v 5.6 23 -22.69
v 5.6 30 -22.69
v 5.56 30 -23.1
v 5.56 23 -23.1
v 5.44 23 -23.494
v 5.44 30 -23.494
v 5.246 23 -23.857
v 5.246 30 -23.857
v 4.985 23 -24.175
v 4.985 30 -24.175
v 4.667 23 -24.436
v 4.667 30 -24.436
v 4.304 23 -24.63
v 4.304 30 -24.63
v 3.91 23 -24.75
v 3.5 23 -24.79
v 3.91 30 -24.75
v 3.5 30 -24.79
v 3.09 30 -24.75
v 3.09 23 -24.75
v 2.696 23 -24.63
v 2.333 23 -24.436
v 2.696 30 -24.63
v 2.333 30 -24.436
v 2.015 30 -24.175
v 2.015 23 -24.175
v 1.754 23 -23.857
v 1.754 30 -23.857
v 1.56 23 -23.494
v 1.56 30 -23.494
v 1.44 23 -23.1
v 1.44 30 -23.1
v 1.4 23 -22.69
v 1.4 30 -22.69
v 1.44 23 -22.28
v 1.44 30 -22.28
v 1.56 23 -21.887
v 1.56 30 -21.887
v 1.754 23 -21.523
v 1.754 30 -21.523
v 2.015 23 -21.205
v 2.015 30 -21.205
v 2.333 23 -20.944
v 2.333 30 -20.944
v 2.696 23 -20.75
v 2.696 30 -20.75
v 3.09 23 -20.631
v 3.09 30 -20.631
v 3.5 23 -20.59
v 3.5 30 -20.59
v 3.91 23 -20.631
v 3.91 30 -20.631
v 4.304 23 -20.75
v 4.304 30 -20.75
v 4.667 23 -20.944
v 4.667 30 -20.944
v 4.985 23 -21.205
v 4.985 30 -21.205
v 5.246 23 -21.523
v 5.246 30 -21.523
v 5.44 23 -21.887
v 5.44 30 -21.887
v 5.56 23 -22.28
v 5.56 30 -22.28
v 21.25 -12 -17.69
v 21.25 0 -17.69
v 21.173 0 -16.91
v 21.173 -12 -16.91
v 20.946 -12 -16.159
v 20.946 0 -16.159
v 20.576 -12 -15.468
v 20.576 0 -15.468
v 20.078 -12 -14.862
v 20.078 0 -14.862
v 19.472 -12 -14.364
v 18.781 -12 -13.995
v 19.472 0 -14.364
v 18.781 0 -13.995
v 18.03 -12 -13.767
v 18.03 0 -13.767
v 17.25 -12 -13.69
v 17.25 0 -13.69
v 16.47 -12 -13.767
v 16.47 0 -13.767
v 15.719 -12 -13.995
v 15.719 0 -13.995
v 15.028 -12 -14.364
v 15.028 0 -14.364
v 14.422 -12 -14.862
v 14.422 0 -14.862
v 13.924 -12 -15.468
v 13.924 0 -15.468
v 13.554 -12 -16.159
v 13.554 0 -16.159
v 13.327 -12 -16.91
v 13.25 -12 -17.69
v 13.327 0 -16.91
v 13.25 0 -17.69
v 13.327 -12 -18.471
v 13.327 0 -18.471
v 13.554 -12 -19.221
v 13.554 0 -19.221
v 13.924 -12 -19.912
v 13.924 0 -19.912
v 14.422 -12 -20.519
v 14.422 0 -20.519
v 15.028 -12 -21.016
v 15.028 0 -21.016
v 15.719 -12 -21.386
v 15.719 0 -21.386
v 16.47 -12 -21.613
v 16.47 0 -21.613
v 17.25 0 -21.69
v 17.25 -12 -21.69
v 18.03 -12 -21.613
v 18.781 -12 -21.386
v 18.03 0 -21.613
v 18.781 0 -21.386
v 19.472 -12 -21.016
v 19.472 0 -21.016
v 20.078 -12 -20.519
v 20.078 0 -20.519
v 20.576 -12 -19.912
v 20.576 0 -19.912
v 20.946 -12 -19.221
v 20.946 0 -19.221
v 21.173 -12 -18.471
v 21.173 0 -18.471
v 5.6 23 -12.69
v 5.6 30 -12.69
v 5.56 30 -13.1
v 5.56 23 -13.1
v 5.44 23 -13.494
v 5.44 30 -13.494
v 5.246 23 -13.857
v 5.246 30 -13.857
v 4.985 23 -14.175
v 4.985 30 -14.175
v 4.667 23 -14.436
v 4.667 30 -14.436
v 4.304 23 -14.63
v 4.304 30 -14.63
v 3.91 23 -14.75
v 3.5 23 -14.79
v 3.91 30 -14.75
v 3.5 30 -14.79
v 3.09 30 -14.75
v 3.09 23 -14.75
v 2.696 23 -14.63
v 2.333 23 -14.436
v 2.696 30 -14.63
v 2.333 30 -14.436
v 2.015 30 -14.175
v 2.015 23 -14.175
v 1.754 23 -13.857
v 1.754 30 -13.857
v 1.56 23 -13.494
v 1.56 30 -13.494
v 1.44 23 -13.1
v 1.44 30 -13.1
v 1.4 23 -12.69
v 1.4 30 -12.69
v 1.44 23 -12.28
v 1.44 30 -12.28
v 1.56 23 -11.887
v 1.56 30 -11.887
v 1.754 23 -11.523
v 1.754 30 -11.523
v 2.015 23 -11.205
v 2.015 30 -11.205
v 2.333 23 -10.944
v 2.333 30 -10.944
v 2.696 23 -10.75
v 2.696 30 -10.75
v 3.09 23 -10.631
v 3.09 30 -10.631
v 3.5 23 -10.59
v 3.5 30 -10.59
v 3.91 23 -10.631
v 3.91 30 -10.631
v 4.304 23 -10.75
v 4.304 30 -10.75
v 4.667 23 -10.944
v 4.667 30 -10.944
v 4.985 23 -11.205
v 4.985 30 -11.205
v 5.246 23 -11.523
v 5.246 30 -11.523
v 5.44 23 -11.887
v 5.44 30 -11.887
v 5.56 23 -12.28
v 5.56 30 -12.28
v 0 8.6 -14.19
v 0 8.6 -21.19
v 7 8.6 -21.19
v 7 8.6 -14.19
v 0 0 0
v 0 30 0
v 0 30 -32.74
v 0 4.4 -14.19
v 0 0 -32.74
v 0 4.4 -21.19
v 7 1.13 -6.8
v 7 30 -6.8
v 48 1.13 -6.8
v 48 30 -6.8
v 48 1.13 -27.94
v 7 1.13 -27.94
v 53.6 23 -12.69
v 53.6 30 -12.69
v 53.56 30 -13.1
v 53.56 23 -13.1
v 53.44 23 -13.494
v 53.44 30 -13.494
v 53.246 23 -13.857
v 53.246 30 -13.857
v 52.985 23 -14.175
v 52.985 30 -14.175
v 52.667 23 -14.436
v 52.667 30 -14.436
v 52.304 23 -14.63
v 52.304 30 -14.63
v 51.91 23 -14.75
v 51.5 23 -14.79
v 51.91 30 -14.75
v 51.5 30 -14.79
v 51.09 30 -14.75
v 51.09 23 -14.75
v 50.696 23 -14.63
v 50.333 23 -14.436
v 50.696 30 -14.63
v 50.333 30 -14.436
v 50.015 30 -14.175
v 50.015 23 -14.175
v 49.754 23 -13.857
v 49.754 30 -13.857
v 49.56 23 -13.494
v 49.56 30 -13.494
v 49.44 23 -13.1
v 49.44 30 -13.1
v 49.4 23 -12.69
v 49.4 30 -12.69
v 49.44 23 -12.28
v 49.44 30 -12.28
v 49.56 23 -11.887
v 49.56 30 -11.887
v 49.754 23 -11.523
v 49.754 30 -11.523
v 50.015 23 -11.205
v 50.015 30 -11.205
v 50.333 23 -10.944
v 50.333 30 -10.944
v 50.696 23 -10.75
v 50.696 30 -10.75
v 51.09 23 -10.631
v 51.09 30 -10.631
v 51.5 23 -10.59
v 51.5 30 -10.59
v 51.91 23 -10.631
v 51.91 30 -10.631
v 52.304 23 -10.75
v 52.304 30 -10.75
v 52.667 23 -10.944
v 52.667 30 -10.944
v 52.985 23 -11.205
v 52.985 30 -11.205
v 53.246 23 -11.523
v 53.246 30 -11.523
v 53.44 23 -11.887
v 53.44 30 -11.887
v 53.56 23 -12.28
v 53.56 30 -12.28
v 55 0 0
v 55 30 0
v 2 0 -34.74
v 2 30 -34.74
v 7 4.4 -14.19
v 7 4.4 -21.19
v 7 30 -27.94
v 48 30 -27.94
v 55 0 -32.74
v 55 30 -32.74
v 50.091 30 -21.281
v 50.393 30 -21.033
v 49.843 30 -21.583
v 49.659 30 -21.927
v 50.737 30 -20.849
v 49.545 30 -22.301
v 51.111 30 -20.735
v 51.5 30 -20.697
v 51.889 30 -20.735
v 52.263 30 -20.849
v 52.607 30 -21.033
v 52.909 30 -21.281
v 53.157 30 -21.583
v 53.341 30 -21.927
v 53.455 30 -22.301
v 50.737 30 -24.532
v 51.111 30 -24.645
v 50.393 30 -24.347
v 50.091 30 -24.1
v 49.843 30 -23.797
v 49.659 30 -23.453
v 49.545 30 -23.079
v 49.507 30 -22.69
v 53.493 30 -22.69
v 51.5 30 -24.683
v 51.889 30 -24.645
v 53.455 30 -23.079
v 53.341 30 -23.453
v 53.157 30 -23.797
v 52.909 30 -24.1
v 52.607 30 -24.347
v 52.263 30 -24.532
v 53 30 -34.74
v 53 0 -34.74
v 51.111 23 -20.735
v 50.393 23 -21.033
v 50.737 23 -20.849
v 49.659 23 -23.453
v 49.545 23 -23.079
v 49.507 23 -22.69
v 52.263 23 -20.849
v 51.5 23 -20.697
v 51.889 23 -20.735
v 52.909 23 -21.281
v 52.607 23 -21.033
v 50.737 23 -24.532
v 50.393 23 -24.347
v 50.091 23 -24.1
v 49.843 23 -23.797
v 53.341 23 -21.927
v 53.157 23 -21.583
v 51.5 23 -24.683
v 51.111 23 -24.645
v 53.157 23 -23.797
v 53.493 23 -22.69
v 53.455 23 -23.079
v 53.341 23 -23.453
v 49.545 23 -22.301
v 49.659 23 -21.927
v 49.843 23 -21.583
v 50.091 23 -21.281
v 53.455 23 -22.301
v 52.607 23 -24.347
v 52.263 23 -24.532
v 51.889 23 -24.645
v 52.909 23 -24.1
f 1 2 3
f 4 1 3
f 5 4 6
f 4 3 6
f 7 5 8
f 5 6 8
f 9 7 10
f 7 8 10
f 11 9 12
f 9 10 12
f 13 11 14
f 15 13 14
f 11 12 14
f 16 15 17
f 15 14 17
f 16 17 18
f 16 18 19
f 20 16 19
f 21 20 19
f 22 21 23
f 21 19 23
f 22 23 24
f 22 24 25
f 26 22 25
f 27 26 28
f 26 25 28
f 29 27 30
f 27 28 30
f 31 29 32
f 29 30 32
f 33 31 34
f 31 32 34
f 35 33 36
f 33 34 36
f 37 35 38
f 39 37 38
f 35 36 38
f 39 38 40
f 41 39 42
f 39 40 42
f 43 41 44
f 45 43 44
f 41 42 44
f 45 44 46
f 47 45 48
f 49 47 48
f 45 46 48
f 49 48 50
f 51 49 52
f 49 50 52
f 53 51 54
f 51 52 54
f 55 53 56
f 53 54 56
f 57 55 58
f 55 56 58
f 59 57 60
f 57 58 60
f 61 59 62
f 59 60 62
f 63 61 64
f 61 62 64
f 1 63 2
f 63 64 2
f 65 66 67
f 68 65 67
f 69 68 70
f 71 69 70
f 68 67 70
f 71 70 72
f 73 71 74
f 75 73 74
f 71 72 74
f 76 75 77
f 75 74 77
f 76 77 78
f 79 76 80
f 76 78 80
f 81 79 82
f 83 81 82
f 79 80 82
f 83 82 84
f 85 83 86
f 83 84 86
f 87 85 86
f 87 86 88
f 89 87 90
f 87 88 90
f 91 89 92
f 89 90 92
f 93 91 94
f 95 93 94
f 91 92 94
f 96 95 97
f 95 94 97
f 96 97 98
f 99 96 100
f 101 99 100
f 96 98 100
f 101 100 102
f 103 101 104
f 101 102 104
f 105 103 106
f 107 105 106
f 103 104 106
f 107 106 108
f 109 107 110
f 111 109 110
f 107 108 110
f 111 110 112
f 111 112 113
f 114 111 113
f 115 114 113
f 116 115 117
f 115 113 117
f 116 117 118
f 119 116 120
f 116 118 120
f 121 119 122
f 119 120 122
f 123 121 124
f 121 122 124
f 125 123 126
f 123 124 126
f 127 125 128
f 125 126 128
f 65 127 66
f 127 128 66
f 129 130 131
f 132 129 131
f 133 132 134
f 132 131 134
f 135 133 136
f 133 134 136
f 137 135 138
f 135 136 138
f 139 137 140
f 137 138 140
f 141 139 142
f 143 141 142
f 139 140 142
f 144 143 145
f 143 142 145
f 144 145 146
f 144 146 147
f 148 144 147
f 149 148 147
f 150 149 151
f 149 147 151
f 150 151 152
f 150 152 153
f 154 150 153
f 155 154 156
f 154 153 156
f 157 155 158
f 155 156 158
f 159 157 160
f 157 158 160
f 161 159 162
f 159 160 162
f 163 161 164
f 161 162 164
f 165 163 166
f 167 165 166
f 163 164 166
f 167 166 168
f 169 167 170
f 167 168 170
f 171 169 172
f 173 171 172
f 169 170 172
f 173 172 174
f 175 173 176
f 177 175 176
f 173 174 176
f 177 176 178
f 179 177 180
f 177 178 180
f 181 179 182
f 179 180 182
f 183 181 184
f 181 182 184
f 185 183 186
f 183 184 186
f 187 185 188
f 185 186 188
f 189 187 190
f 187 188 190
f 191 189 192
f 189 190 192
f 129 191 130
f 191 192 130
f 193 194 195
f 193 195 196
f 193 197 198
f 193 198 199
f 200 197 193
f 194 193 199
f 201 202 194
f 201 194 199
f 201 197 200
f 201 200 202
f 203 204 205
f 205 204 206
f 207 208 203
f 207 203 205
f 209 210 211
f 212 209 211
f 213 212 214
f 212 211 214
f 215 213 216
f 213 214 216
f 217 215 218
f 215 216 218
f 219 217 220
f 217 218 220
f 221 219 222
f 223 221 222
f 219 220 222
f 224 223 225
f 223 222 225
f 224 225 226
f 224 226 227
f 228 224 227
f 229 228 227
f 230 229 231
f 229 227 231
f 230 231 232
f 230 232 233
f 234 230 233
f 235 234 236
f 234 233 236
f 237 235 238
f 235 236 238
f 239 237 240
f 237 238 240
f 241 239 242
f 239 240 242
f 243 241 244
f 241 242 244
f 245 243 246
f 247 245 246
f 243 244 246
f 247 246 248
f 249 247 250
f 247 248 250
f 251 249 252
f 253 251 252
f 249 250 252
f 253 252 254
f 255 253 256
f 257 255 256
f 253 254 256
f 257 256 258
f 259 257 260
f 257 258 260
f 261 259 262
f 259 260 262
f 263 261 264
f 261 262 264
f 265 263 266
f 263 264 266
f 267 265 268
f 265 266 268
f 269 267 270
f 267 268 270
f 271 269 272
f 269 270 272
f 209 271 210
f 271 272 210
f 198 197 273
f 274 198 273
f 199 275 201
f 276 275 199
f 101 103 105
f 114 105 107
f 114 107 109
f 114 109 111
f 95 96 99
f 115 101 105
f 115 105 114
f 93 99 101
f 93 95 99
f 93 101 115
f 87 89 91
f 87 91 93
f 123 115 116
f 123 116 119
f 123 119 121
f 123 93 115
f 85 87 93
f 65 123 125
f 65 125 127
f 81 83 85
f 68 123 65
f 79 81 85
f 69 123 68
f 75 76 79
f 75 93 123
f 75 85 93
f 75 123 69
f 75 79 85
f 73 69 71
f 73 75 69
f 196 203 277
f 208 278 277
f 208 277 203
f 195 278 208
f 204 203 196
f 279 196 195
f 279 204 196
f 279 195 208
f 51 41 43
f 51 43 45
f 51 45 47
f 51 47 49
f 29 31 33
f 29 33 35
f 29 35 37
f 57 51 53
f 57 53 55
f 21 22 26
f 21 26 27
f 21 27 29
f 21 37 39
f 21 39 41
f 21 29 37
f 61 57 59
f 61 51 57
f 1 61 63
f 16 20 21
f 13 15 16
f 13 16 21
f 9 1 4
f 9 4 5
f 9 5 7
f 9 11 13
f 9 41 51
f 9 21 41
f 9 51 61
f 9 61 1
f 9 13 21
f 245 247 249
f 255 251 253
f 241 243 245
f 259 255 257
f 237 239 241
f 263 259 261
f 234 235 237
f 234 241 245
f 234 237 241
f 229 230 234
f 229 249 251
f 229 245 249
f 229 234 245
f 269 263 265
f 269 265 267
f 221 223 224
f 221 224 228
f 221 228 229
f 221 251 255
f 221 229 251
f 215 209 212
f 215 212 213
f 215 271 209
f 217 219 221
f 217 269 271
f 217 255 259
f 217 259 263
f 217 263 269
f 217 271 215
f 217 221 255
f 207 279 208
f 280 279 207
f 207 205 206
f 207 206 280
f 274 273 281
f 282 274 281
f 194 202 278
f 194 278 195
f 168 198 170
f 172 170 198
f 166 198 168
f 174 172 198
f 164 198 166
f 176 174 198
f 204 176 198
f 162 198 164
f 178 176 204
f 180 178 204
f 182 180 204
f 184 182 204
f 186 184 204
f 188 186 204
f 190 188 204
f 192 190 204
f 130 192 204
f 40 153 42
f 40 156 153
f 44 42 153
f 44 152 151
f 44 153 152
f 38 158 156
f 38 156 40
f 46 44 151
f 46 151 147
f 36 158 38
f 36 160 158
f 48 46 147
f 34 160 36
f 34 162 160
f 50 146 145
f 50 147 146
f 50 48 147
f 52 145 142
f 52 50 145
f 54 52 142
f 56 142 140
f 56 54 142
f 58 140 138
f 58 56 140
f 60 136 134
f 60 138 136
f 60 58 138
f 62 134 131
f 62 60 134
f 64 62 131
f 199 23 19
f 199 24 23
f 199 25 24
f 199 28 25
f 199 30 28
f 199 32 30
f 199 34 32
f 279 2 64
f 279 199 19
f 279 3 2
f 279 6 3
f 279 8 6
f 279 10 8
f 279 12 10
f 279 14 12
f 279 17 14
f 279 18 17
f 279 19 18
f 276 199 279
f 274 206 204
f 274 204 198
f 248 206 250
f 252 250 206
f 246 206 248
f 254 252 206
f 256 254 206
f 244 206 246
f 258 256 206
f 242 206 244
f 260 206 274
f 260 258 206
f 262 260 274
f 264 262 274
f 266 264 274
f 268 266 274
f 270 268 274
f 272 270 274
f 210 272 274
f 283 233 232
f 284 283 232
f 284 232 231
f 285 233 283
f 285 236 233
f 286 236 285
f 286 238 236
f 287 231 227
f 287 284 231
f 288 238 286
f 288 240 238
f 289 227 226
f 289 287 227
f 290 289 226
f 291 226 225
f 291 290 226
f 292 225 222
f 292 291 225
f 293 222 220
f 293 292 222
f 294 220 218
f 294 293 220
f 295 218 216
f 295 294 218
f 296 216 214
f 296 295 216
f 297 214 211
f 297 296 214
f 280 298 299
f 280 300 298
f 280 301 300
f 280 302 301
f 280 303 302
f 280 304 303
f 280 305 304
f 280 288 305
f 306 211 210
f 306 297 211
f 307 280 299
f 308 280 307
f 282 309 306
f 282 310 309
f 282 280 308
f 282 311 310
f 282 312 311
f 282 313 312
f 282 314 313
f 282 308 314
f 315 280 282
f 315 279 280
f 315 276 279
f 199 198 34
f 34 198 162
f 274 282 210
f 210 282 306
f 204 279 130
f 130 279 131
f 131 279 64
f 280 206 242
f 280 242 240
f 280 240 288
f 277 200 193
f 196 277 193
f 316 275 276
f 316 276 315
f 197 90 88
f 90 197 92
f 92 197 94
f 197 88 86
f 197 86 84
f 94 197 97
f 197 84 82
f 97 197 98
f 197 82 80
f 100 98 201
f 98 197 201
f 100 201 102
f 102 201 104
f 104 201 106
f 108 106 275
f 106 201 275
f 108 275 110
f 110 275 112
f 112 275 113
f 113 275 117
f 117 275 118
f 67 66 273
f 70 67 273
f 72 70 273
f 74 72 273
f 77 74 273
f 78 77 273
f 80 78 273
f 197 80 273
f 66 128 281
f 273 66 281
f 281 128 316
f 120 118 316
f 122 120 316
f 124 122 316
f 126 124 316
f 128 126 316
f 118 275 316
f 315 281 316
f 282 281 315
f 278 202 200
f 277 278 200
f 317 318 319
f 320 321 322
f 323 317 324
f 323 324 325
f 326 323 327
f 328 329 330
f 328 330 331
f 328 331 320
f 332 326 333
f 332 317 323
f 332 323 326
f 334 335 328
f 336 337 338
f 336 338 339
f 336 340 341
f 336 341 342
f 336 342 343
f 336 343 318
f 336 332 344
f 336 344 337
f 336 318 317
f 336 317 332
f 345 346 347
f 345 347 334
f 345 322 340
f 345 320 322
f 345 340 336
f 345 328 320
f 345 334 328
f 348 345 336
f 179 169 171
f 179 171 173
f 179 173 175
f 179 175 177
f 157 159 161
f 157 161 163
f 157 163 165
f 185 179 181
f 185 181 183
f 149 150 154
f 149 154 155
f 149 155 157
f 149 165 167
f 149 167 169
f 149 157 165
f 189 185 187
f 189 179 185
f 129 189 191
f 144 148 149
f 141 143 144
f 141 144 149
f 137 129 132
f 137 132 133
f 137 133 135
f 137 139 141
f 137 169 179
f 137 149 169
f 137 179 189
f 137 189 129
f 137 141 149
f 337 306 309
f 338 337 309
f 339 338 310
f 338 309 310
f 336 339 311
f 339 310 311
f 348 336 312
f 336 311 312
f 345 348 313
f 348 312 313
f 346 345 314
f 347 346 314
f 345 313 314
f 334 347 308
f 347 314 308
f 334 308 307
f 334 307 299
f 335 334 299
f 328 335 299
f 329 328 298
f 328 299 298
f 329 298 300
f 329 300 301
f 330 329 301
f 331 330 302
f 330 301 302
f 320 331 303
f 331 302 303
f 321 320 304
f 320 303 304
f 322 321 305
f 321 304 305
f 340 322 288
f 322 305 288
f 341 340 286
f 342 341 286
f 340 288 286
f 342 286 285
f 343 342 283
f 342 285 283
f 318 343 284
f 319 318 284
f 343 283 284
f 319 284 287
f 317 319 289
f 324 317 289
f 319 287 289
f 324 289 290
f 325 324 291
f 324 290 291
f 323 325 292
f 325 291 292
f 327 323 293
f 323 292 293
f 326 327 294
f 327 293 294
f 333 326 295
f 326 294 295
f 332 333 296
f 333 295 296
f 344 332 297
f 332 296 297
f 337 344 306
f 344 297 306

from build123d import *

# Parameters (mm, degrees)
SKETCH1_W           = 55
SKETCH1_H           = 34.740153272
BOSS_EXTRUDE1_DEPTH = 30
SKETCH3_W           = 41
SKETCH3_H           = 21.140153272
CUT_EXTRUDE1_DEPTH  = 28.87
SKETCH5_W           = 7
SKETCH5_H           = 4.2
CUT_EXTRUDE2_DEPTH  = 10
SKETCH6_R           = 2.1
SKETCH6_R_2         = 1.99312569
CUT_EXTRUDE3_DEPTH  = 7
SKETCH7_R           = 4
BOSS_EXTRUDE2_DEPTH = 12
CHAMFER1_SIZE       = 2


with BuildPart() as part:
    # Sketch1 → Boss-Extrude1 (new body)
    with BuildSketch(Plane(origin=(0, 0, 0), x_dir=(1, 0, 0), z_dir=(0, 1, 0))):
        with Locations((27.5, 17.370076636)):
            Rectangle(SKETCH1_W, SKETCH1_H)
    extrude(amount=BOSS_EXTRUDE1_DEPTH)

    # Sketch3 → Cut-Extrude1 (cut)
    with BuildSketch(Plane(origin=(0, 30, 0), x_dir=(1, 0, 0), z_dir=(0, 1, 0))):
        with Locations((27.5, 17.370076636)):
            Rectangle(SKETCH3_W, SKETCH3_H)
    extrude(amount=-CUT_EXTRUDE1_DEPTH, mode=Mode.SUBTRACT)

    # Sketch5 → Cut-Extrude2 (cut)
    with BuildSketch(Plane.ZY):
        with Locations((-17.690153272, 6.5)):
            Rectangle(SKETCH5_W, SKETCH5_H)
    extrude(amount=-CUT_EXTRUDE2_DEPTH, mode=Mode.SUBTRACT)

    # Sketch6 → Cut-Extrude3 (cut)
    with BuildSketch(Plane(origin=(0, 30, 0), x_dir=(1, 0, 0), z_dir=(0, 1, 0))):
        with Locations((3.5, 22.690153272)):
            Circle(SKETCH6_R)
        with Locations((3.5, 12.690153272)):
            Circle(SKETCH6_R)
        with Locations((51.5, 12.690153272)):
            Circle(SKETCH6_R)
        with Locations((51.5, 22.690153272)):
            Circle(SKETCH6_R_2)
    extrude(amount=-CUT_EXTRUDE3_DEPTH, mode=Mode.SUBTRACT)

    # Sketch7 → Boss-Extrude2 (add)
    with BuildSketch(Plane.XZ):
        with Locations((17.25, -17.690153272)):
            Circle(SKETCH7_R)
    extrude(amount=BOSS_EXTRUDE2_DEPTH)

    # Chamfer1
    chamfer1_edges = [part.edges().sort_by_distance(p)[0] for p in [
        (0, 15, -34.740153272),
        (55, 15, -34.740153272),
    ]]
    chamfer(chamfer1_edges, length=CHAMFER1_SIZE)


solid = part.part
